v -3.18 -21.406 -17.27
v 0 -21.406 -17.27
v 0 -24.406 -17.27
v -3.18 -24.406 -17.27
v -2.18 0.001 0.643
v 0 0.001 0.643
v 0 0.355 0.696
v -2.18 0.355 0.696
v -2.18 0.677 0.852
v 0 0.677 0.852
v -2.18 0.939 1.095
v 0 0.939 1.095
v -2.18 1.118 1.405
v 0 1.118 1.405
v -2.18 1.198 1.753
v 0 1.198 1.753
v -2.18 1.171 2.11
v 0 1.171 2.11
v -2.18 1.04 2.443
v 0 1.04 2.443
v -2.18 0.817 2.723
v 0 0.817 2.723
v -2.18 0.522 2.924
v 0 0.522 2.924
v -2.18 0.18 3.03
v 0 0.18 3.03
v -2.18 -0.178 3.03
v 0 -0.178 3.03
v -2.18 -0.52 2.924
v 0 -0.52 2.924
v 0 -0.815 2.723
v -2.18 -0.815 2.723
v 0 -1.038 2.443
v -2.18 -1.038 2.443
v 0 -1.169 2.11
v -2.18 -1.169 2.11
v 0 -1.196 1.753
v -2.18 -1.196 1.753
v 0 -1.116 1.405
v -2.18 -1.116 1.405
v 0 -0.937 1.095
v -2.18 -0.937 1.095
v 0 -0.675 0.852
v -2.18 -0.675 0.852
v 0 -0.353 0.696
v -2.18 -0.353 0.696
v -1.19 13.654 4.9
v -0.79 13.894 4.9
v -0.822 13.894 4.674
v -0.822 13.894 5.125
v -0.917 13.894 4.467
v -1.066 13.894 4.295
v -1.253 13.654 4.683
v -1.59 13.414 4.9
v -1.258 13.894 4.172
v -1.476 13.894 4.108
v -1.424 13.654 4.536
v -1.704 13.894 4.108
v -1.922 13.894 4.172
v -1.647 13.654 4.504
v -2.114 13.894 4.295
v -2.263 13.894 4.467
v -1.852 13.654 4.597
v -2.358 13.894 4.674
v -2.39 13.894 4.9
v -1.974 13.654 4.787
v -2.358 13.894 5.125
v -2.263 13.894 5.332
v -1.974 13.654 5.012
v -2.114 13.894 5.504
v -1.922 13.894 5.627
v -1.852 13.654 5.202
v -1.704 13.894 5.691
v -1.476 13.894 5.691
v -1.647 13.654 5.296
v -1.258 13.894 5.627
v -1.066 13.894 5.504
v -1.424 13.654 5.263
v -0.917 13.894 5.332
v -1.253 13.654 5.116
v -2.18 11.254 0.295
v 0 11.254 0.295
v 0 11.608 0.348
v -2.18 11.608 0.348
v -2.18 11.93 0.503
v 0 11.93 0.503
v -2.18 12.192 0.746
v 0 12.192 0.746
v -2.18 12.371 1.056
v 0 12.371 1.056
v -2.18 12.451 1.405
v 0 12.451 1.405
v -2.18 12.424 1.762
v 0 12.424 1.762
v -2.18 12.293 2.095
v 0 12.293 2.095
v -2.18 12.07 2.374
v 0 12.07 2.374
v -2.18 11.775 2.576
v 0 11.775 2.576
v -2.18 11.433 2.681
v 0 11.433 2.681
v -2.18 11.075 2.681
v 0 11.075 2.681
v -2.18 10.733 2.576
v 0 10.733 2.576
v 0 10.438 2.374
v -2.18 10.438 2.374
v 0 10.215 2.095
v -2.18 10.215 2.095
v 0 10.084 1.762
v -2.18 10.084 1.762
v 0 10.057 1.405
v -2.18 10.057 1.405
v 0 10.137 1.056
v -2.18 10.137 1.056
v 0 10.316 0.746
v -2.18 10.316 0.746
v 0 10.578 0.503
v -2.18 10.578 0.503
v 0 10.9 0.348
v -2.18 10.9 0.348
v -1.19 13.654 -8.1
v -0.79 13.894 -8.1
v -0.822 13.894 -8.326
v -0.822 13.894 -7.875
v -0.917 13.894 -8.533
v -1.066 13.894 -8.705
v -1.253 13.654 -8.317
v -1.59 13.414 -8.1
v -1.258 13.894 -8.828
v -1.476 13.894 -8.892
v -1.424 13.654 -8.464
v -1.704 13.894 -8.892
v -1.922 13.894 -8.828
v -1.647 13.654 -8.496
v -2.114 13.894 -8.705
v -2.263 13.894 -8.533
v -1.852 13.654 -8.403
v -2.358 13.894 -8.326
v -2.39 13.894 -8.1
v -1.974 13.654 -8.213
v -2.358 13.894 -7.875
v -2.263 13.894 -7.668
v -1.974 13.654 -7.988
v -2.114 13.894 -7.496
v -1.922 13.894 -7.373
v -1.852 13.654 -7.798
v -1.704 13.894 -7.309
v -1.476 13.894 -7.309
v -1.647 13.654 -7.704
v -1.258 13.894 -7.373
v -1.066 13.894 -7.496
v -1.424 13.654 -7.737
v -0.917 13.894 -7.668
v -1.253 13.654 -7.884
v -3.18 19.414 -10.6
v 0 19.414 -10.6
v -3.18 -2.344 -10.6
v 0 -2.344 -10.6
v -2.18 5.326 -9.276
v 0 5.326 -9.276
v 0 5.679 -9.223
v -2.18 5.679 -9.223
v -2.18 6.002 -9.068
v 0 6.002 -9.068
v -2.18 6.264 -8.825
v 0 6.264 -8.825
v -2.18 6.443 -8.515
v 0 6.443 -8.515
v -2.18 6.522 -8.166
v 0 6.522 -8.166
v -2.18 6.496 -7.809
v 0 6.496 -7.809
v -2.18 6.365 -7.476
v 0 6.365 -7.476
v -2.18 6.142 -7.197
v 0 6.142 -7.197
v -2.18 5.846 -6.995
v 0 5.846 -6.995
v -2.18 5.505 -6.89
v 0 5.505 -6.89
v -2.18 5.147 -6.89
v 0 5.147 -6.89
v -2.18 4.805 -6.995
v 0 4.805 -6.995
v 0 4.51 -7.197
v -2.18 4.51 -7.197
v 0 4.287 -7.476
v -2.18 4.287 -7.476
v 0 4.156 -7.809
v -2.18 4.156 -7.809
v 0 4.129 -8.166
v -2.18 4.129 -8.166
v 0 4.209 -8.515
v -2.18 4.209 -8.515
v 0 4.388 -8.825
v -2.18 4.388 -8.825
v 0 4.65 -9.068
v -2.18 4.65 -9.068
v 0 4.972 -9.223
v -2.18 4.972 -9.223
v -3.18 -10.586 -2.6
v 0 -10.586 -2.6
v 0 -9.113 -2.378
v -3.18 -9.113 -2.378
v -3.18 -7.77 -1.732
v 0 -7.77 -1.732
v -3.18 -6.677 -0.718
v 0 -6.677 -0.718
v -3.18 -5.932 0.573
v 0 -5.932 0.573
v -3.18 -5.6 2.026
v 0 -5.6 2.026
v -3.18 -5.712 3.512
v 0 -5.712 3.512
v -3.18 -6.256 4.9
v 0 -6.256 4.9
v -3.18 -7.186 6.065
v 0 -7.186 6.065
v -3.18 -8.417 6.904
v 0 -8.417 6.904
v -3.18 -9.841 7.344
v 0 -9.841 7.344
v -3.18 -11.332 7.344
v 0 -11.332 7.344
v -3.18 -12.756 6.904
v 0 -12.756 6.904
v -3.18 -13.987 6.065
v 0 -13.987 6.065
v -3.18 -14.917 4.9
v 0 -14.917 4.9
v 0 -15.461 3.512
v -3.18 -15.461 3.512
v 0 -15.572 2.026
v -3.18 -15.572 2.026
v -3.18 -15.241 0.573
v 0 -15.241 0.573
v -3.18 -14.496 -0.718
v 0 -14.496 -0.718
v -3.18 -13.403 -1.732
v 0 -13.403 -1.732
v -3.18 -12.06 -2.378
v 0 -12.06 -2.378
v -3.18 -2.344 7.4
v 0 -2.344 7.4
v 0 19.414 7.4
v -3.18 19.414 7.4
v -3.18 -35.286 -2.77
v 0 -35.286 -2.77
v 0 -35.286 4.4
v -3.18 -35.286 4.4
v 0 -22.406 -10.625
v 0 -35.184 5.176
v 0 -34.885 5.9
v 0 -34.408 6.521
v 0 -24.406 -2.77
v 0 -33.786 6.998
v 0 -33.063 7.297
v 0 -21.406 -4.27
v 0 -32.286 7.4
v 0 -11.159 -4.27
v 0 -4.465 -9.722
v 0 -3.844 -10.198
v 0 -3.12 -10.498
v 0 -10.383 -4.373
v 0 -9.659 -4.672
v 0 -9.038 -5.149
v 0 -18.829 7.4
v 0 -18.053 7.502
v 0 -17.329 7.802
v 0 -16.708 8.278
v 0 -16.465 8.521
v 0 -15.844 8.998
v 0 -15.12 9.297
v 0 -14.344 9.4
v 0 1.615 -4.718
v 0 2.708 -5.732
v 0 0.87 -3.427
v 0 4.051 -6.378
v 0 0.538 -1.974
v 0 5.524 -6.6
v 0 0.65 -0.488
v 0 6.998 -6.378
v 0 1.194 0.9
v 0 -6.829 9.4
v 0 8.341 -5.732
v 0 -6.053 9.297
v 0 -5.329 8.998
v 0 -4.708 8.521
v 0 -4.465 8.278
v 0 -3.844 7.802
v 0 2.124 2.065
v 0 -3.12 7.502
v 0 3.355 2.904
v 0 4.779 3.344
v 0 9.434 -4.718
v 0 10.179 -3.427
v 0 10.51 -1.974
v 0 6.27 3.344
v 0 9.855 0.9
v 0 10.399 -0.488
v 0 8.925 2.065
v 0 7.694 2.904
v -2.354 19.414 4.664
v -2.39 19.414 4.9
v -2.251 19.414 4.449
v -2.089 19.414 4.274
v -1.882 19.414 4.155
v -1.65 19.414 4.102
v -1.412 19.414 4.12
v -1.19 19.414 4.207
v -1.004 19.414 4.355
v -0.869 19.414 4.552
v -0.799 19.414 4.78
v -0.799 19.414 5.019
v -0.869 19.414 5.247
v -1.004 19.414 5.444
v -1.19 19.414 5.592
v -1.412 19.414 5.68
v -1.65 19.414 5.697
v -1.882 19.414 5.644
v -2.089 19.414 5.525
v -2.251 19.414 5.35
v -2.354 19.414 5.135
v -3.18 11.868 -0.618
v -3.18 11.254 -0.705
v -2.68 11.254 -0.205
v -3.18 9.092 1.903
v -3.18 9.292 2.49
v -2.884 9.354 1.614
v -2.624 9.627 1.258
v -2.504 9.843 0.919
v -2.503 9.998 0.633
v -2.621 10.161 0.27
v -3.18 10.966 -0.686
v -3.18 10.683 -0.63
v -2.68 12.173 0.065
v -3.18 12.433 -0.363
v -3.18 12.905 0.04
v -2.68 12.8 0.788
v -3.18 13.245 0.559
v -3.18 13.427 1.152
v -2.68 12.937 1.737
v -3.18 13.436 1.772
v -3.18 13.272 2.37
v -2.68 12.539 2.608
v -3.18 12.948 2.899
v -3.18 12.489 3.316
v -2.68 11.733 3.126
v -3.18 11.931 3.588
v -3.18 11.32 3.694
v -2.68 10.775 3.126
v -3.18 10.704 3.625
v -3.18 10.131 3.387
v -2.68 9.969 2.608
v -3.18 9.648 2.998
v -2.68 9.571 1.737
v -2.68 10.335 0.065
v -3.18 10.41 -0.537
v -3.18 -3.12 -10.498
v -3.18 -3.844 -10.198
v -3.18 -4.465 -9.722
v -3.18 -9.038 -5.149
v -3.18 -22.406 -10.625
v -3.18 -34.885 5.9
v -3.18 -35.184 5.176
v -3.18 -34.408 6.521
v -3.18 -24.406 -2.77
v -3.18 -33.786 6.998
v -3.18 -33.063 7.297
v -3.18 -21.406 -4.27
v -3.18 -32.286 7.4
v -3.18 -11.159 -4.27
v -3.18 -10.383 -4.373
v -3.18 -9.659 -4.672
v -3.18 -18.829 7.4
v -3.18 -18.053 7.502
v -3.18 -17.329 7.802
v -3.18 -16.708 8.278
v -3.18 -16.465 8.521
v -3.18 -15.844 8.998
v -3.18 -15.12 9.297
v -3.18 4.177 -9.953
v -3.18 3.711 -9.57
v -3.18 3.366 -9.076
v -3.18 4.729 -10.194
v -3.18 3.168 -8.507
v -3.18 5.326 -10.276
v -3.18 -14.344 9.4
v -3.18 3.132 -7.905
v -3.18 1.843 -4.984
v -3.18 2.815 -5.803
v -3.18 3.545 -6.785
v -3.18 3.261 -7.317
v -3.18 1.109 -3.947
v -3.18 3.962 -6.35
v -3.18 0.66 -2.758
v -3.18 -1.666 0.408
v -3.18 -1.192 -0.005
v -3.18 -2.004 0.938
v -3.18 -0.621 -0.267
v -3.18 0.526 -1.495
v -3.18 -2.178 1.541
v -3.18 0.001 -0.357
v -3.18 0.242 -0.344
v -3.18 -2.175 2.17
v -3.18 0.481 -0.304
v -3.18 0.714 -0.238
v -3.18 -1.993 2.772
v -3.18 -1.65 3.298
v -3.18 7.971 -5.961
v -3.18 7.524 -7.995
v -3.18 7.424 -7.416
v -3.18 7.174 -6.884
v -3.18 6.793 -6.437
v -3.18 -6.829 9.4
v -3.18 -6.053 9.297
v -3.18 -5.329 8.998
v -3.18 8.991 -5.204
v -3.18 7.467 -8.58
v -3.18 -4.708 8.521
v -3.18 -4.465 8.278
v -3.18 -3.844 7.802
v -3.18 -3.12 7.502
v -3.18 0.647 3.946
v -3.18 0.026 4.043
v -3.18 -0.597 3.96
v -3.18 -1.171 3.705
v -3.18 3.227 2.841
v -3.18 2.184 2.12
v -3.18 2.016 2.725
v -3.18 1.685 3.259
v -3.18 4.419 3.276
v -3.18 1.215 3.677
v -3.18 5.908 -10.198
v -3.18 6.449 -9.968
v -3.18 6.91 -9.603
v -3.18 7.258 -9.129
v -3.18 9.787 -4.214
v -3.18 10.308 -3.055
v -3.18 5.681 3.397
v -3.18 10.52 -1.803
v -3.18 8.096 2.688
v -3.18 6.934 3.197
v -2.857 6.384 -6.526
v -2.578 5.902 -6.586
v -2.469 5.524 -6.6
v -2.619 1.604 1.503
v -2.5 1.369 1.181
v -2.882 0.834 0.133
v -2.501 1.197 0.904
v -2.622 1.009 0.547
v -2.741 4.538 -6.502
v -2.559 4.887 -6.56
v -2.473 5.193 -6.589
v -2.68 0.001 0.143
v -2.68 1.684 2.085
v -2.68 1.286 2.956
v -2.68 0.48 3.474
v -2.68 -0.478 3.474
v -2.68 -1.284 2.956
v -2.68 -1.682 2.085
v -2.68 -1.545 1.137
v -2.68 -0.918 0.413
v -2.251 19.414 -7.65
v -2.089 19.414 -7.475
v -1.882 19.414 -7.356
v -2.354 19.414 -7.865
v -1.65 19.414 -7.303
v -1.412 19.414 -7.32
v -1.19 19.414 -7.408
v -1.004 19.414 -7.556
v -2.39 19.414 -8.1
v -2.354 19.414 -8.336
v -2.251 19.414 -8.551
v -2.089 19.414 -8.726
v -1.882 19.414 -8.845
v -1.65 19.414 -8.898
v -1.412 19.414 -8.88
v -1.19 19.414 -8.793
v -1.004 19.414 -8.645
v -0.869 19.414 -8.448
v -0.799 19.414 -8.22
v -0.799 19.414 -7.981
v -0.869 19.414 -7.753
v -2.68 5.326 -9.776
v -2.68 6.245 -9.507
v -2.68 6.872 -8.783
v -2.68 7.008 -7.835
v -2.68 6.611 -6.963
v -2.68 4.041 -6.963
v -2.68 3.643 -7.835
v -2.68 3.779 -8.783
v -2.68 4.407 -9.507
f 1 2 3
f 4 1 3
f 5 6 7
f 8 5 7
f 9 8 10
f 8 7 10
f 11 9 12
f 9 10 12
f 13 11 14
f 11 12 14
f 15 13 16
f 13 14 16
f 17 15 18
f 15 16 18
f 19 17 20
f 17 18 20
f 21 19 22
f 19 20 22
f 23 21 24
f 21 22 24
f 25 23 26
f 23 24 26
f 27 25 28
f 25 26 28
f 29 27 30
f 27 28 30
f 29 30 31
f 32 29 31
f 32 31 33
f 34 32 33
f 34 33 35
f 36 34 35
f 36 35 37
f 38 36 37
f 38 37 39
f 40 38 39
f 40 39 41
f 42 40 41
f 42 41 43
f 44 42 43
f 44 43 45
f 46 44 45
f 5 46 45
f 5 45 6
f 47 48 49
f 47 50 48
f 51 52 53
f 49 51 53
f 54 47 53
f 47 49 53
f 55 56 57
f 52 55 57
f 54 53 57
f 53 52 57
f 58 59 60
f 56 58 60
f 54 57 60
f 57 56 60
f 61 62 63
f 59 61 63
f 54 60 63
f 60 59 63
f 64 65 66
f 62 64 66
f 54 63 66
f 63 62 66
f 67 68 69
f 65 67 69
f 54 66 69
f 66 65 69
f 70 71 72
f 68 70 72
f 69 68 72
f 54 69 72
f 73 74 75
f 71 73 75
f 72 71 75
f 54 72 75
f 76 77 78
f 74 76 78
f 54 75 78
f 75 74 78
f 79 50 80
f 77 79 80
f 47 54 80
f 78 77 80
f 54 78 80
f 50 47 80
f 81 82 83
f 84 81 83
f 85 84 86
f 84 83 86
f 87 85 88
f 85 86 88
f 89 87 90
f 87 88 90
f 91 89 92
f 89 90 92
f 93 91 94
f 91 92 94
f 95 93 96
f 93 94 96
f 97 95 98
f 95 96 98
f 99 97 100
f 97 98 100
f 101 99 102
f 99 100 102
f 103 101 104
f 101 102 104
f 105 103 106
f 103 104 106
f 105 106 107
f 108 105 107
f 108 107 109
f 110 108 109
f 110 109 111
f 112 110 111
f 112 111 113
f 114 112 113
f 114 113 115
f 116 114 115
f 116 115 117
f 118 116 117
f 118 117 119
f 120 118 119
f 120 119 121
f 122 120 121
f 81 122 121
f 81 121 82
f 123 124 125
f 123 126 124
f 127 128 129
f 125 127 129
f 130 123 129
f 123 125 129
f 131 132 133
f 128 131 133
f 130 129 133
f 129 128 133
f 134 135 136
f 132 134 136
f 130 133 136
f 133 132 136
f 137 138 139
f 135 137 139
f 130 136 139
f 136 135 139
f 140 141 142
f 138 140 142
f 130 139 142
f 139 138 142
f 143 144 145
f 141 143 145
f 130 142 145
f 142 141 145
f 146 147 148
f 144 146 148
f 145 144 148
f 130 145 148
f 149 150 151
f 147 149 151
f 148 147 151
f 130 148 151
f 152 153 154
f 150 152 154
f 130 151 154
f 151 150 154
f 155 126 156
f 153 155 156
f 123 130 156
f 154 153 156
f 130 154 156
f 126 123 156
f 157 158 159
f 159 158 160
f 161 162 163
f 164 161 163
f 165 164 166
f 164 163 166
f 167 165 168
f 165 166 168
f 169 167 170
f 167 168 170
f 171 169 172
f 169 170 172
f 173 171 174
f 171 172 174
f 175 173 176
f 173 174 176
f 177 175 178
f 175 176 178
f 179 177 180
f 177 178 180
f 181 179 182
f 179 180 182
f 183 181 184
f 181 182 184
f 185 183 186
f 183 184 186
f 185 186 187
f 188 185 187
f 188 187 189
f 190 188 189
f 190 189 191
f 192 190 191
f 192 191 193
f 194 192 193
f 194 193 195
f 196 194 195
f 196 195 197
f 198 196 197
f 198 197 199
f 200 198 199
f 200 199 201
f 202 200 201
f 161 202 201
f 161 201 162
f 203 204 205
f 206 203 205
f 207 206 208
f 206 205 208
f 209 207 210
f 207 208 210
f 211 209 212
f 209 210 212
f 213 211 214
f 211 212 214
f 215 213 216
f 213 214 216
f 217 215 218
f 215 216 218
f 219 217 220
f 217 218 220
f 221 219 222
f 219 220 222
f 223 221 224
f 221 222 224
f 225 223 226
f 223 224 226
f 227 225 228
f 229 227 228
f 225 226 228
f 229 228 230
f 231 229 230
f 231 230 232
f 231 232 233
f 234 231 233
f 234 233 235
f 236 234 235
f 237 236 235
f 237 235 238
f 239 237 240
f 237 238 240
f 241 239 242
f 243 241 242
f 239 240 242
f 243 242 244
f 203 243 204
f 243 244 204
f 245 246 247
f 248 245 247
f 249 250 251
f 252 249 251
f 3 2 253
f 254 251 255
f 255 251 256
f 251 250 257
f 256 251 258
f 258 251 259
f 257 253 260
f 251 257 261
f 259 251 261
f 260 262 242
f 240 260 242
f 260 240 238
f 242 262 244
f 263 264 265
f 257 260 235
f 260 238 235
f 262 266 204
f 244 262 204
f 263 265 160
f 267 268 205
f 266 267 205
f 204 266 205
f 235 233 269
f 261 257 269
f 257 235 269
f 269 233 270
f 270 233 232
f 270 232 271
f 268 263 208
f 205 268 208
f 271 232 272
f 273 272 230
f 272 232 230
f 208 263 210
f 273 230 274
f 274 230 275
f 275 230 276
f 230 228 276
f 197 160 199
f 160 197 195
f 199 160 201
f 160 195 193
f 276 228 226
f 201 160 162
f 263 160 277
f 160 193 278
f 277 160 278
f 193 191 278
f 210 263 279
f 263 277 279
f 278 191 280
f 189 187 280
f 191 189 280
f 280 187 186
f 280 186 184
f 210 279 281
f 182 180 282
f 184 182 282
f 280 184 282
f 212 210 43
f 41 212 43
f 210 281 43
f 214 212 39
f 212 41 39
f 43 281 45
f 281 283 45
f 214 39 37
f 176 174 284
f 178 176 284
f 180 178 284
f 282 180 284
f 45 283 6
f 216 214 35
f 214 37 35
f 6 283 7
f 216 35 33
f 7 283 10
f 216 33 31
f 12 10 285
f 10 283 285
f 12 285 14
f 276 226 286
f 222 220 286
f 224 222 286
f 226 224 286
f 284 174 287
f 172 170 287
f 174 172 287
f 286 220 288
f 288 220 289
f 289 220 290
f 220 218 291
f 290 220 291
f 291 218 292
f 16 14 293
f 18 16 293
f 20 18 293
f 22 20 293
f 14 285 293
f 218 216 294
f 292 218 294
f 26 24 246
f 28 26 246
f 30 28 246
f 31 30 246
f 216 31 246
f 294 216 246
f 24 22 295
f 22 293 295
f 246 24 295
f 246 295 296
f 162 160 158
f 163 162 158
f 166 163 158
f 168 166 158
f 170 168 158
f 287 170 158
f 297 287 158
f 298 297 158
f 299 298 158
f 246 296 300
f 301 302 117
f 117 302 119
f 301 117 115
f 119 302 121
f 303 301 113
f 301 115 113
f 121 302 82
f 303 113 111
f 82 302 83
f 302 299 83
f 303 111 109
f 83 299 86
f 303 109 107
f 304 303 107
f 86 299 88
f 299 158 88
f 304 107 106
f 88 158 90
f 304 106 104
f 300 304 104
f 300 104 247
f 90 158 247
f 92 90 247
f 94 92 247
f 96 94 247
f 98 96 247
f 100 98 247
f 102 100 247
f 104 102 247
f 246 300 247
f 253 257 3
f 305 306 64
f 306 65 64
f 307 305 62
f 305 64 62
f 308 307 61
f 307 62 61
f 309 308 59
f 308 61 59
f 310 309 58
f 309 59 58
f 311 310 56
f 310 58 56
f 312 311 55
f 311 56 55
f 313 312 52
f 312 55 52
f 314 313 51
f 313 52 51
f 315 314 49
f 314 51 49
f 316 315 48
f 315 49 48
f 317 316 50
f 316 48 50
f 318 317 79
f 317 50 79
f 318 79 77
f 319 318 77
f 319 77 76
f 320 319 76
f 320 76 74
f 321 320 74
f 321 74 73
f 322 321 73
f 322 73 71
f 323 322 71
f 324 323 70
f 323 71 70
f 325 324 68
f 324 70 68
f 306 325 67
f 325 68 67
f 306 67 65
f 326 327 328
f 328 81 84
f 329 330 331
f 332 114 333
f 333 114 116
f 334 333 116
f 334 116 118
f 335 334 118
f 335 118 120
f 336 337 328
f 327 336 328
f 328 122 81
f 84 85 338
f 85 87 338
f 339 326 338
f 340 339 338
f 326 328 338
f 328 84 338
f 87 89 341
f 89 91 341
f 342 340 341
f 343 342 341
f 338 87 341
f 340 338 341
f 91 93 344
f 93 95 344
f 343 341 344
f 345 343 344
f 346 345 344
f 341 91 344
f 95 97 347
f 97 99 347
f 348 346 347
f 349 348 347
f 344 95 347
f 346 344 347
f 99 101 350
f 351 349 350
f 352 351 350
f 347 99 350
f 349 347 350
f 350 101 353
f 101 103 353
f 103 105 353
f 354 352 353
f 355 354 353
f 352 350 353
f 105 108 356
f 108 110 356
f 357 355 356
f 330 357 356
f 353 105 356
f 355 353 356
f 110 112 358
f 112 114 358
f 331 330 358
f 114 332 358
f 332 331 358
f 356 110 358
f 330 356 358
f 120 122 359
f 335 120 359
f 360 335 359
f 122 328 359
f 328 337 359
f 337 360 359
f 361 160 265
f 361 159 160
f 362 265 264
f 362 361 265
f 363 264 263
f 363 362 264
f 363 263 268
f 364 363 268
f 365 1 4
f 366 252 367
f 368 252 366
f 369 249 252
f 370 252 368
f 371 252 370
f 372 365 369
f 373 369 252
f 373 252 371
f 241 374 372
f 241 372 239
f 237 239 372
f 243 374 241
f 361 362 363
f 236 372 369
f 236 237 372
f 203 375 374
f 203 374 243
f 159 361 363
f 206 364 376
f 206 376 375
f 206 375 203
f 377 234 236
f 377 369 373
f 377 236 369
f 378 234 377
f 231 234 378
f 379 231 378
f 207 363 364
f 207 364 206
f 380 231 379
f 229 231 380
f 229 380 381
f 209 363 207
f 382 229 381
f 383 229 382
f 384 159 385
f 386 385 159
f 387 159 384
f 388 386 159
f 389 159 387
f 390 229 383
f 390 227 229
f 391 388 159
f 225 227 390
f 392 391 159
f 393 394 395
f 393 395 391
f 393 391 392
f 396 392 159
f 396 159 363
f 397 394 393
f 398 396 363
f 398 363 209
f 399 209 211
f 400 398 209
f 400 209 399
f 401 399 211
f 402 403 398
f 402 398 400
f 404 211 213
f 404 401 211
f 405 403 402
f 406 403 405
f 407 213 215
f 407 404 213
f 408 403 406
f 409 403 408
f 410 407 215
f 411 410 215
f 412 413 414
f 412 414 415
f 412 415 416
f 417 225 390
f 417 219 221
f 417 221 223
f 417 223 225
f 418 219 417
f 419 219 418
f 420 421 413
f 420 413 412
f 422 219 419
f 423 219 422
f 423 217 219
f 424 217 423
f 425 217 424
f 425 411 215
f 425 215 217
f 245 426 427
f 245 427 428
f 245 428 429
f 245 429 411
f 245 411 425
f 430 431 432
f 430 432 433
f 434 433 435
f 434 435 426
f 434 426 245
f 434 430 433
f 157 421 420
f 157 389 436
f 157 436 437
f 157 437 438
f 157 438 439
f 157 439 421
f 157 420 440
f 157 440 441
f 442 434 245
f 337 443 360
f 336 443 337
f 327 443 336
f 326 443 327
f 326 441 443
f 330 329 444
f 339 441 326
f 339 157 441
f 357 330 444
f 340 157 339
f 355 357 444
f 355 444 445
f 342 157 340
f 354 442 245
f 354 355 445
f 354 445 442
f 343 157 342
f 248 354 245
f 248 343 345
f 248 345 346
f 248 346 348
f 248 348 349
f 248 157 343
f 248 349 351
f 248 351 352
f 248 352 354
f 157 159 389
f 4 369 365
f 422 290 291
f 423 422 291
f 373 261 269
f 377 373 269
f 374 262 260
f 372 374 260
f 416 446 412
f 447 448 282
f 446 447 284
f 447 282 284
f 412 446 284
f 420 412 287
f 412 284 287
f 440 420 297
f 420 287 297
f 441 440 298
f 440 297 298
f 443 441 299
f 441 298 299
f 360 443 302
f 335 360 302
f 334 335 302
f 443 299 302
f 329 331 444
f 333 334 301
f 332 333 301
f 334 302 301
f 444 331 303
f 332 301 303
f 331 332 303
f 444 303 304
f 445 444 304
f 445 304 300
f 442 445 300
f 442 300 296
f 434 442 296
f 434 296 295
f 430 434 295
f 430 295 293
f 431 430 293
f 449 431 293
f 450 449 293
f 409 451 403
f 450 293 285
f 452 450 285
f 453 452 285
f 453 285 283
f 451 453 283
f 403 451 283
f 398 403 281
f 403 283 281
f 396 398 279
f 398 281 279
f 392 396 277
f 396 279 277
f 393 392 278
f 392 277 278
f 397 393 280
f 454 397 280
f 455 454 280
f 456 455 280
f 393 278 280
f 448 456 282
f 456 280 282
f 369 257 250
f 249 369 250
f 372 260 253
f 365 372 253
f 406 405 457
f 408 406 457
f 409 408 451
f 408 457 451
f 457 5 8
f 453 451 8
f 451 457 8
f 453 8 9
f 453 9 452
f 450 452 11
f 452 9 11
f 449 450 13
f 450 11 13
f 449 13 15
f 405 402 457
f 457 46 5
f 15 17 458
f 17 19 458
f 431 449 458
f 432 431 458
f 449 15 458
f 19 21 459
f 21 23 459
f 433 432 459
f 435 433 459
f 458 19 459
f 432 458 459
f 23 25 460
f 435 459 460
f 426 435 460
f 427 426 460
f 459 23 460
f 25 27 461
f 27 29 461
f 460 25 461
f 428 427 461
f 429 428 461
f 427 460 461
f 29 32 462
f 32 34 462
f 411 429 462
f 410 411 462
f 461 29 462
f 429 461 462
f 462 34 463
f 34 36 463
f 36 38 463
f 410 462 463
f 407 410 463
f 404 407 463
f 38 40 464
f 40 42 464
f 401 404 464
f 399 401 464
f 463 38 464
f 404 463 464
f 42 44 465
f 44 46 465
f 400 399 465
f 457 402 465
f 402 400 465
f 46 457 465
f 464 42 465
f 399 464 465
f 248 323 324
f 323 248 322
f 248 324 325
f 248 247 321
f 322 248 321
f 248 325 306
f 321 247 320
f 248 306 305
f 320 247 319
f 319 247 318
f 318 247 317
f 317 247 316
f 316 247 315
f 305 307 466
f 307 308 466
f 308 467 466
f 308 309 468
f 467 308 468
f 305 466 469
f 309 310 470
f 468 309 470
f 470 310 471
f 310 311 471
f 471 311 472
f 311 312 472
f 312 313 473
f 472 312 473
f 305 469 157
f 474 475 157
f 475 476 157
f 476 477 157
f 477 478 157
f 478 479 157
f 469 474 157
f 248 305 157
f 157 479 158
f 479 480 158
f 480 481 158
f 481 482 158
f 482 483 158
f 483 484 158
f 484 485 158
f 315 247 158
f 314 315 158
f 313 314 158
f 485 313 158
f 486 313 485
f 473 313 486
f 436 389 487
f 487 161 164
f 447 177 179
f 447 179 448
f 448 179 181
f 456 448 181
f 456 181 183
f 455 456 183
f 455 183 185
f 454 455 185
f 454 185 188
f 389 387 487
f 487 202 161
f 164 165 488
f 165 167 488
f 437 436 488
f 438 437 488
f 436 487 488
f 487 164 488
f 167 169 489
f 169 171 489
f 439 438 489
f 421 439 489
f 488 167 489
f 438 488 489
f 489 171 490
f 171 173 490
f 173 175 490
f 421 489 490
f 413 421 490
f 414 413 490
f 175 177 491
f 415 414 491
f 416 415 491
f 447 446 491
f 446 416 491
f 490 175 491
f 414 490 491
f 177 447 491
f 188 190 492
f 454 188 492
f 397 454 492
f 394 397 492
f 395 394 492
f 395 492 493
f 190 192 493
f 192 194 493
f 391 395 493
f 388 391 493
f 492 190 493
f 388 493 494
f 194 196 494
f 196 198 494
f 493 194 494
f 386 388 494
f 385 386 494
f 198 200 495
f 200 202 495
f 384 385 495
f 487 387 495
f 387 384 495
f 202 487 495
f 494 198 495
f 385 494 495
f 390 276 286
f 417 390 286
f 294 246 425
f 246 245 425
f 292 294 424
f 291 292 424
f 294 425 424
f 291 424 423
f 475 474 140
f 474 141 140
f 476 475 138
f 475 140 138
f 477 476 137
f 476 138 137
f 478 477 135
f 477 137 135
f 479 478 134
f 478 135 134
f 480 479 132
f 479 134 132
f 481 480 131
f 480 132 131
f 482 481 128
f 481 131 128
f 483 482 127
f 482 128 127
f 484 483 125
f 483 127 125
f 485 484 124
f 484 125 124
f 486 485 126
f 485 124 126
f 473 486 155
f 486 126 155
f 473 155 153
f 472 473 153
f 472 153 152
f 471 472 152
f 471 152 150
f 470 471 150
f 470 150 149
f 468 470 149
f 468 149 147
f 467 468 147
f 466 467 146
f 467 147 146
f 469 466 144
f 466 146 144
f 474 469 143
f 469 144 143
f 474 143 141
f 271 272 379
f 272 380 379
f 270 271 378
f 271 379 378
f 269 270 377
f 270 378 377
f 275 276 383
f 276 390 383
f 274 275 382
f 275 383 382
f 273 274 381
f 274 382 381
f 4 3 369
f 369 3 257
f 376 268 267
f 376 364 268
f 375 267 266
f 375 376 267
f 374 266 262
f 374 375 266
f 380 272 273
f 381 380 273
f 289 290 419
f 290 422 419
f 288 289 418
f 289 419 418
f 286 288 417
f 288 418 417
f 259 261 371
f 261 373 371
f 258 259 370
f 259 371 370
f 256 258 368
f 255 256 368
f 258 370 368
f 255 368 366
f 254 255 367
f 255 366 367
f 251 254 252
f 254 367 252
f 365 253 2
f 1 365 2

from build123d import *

# Parameters (mm, degrees)
BOSS_EXTRUDE1_DEPTH                             = 3.18
SKETCH2_4_OUTSIDE_W                             = 40.858
SKETCH2_4_OUTSIDE_H                             = 68.888
SKETCH2_4_OUTSIDE_R                             = 5
CUT_EXTRUDE2_DEPTH                              = 3.18
FILLET6_R                                       = 3
M2X0_4_TAPPED_HOLE1_D                           = 1.6
M2X0_4_TAPPED_HOLE1_DEPTH                       = 5.519311505
M2X0_4_TAPPED_HOLE1_TIP                         = 0.480688495
CUT_EXTRUDE3_REACH                              = 40.129
SKETCH7_R                                       = 1
CSK_FOR_M2_FLAT_HEAD_MACHINE_SCREW1_D           = 2.4
CSK_FOR_M2_FLAT_HEAD_MACHINE_SCREW1_DEPTH       = 3.18
CSK_FOR_M2_FLAT_HEAD_MACHINE_SCREW1_CSINK_D     = 4.4
CSK_FOR_M2_FLAT_HEAD_MACHINE_SCREW1_CSINK_ANGLE = 90


with BuildPart() as part:
    # Sketch2 → Boss-Extrude1 (new body)
    with BuildSketch(Plane(origin=(0, 0, 0), x_dir=(0, 0, -1), z_dir=(1, 0, 0))):
        Polygon((-7.39959254, 19.413571875), (10.60040746, 19.413571875), (10.60040746, -3.586428125), (4.27040746, -9.916428125), (4.27040746, -21.406428125), (10.625315102, -22.406428125), (17.27040746, -21.406428125), (17.27040746, -24.406428125), (2.77040746, -24.406428125), (2.77040746, -35.286428125), (-7.39959254, -35.286428125), (-7.39959254, -17.586428125), (-9.39959254, -15.586428125), (-9.39959254, -5.586428125), (-7.39959254, -3.586428125), align=None)
    extrude(amount=-BOSS_EXTRUDE1_DEPTH)

    # Sketch2<4> outside → Cut-Extrude2 (cut)
    # profile 1 of 3: a face of its own
    with BuildSketch(Plane(origin=(0, 0, 0), x_dir=(0, 0, -1), z_dir=(1, 0, 0))):
        with Locations((3.935, -7.936)):
            Rectangle(SKETCH2_4_OUTSIDE_W, SKETCH2_4_OUTSIDE_H)
        Polygon((-7.39959254, 19.413571875), (10.60040746, 19.413571875), (10.60040746, -3.586428125), (4.27040746, -9.916428125), (4.27040746, -21.406428125), (10.625315102, -22.406428125), (17.27040746, -21.406428125), (17.27040746, -24.406428125), (2.77040746, -24.406428125), (2.77040746, -35.286428125), (-7.39959254, -35.286428125), (-7.39959254, -17.586428125), (-9.39959254, -15.586428125), (-9.39959254, -5.586428125), (-7.39959254, -3.586428125), align=None, mode=Mode.SUBTRACT)
    # profile 2 of 3: a face of its own
    with BuildSketch(Plane(origin=(0, 0, 0), x_dir=(0, 0, -1), z_dir=(1, 0, 0))):
        with Locations((-2.39959254, -10.586428125)):
            Circle(SKETCH2_4_OUTSIDE_R)
    # profile 3 of 3: a face of its own
    with BuildSketch(Plane(origin=(0, 0, 0), x_dir=(0, 0, -1), z_dir=(1, 0, 0))):
        with Locations((1.60040746, 5.524437773)):
            Circle(SKETCH2_4_OUTSIDE_R)
    extrude(amount=-CUT_EXTRUDE2_DEPTH, mode=Mode.SUBTRACT)

    # Fillet6
    fillet6_edges = [part.edges().sort_by_distance(p)[0] for p in [
        (-1.59, -3.586428125, 7.39959254),
        (-1.59, -5.586428125, 9.39959254),
        (-1.59, -15.586428125, 9.39959254),
        (-1.59, -17.586428125, 7.39959254),
        (-1.59, -35.286428125, 7.39959254),
        (-1.59, -9.916428125, -4.27040746),
        (-1.59, -3.586428125, -10.60040746),
    ]]
    fillet(fillet6_edges, radius=FILLET6_R)

    # M2x0.4 Tapped Hole1
    with Locations(Plane(origin=(0, 19.413571875, 0), x_dir=(1, 0, 0), z_dir=(0, 1, 0))):
        with Locations((-1.59, 8.10040746), (-1.59, -4.89959254)):
            Hole(M2X0_4_TAPPED_HOLE1_D / 2, depth=M2X0_4_TAPPED_HOLE1_DEPTH)
            with Locations((0, 0, -(M2X0_4_TAPPED_HOLE1_DEPTH + M2X0_4_TAPPED_HOLE1_TIP / 2))):  # 118° drill point
                Cone(0, M2X0_4_TAPPED_HOLE1_D / 2, M2X0_4_TAPPED_HOLE1_TIP, mode=Mode.SUBTRACT)

    # Sketch7 → Cut-Extrude3 (cut, up to next)
    with BuildSketch(Plane(origin=(0, 0, -3.18), x_dir=(0, 0, -1), z_dir=(1, 0, 0)), mode=Mode.PRIVATE) as cut_extrude3_sk1:
        with Locations((-4.67466251, 11.25391193)):
            Circle(SKETCH7_R)
    cut_extrude3_tool1 = extrude(cut_extrude3_sk1.sketch, amount=-CUT_EXTRUDE3_REACH, mode=Mode.PRIVATE) & part.part
    # Sketch7 → Cut-Extrude3 (cut, up to next)
    with BuildSketch(Plane(origin=(0, 0, -3.18), x_dir=(0, 0, -1), z_dir=(1, 0, 0)), mode=Mode.PRIVATE) as cut_extrude3_sk2:
        with Locations((4.896479829, 5.325738996)):
            Circle(SKETCH7_R)
    cut_extrude3_tool2 = extrude(cut_extrude3_sk2.sketch, amount=-CUT_EXTRUDE3_REACH, mode=Mode.PRIVATE) & part.part
    # Sketch7 → Cut-Extrude3 (cut, up to next)
    with BuildSketch(Plane(origin=(0, 0, -3.18), x_dir=(0, 0, -1), z_dir=(1, 0, 0)), mode=Mode.PRIVATE) as cut_extrude3_sk3:
        with Locations((-5.023039699, 0.000973054)):
            Circle(SKETCH7_R)
    cut_extrude3_tool3 = extrude(cut_extrude3_sk3.sketch, amount=-CUT_EXTRUDE3_REACH, mode=Mode.PRIVATE) & part.part
    add(cut_extrude3_tool1.solids().sort_by_distance((0, 11.253912, 1.494663))[0], mode=Mode.SUBTRACT)
    add(cut_extrude3_tool2.solids().sort_by_distance((0, 5.325739, -8.07648))[0], mode=Mode.SUBTRACT)
    add(cut_extrude3_tool3.solids().sort_by_distance((0, 0.000973, 1.84304))[0], mode=Mode.SUBTRACT)

    # CSK for M2 Flat Head Machine Screw1
    with Locations(Plane.ZY.offset(3.18)):
        with Locations((-8.076479829, 5.325738996), (1.49466251, 11.25391193), (1.843039699, 0.000973054)):
            CounterSinkHole(CSK_FOR_M2_FLAT_HEAD_MACHINE_SCREW1_D / 2, CSK_FOR_M2_FLAT_HEAD_MACHINE_SCREW1_CSINK_D / 2, depth=CSK_FOR_M2_FLAT_HEAD_MACHINE_SCREW1_DEPTH, counter_sink_angle=CSK_FOR_M2_FLAT_HEAD_MACHINE_SCREW1_CSINK_ANGLE)


solid = part.part
